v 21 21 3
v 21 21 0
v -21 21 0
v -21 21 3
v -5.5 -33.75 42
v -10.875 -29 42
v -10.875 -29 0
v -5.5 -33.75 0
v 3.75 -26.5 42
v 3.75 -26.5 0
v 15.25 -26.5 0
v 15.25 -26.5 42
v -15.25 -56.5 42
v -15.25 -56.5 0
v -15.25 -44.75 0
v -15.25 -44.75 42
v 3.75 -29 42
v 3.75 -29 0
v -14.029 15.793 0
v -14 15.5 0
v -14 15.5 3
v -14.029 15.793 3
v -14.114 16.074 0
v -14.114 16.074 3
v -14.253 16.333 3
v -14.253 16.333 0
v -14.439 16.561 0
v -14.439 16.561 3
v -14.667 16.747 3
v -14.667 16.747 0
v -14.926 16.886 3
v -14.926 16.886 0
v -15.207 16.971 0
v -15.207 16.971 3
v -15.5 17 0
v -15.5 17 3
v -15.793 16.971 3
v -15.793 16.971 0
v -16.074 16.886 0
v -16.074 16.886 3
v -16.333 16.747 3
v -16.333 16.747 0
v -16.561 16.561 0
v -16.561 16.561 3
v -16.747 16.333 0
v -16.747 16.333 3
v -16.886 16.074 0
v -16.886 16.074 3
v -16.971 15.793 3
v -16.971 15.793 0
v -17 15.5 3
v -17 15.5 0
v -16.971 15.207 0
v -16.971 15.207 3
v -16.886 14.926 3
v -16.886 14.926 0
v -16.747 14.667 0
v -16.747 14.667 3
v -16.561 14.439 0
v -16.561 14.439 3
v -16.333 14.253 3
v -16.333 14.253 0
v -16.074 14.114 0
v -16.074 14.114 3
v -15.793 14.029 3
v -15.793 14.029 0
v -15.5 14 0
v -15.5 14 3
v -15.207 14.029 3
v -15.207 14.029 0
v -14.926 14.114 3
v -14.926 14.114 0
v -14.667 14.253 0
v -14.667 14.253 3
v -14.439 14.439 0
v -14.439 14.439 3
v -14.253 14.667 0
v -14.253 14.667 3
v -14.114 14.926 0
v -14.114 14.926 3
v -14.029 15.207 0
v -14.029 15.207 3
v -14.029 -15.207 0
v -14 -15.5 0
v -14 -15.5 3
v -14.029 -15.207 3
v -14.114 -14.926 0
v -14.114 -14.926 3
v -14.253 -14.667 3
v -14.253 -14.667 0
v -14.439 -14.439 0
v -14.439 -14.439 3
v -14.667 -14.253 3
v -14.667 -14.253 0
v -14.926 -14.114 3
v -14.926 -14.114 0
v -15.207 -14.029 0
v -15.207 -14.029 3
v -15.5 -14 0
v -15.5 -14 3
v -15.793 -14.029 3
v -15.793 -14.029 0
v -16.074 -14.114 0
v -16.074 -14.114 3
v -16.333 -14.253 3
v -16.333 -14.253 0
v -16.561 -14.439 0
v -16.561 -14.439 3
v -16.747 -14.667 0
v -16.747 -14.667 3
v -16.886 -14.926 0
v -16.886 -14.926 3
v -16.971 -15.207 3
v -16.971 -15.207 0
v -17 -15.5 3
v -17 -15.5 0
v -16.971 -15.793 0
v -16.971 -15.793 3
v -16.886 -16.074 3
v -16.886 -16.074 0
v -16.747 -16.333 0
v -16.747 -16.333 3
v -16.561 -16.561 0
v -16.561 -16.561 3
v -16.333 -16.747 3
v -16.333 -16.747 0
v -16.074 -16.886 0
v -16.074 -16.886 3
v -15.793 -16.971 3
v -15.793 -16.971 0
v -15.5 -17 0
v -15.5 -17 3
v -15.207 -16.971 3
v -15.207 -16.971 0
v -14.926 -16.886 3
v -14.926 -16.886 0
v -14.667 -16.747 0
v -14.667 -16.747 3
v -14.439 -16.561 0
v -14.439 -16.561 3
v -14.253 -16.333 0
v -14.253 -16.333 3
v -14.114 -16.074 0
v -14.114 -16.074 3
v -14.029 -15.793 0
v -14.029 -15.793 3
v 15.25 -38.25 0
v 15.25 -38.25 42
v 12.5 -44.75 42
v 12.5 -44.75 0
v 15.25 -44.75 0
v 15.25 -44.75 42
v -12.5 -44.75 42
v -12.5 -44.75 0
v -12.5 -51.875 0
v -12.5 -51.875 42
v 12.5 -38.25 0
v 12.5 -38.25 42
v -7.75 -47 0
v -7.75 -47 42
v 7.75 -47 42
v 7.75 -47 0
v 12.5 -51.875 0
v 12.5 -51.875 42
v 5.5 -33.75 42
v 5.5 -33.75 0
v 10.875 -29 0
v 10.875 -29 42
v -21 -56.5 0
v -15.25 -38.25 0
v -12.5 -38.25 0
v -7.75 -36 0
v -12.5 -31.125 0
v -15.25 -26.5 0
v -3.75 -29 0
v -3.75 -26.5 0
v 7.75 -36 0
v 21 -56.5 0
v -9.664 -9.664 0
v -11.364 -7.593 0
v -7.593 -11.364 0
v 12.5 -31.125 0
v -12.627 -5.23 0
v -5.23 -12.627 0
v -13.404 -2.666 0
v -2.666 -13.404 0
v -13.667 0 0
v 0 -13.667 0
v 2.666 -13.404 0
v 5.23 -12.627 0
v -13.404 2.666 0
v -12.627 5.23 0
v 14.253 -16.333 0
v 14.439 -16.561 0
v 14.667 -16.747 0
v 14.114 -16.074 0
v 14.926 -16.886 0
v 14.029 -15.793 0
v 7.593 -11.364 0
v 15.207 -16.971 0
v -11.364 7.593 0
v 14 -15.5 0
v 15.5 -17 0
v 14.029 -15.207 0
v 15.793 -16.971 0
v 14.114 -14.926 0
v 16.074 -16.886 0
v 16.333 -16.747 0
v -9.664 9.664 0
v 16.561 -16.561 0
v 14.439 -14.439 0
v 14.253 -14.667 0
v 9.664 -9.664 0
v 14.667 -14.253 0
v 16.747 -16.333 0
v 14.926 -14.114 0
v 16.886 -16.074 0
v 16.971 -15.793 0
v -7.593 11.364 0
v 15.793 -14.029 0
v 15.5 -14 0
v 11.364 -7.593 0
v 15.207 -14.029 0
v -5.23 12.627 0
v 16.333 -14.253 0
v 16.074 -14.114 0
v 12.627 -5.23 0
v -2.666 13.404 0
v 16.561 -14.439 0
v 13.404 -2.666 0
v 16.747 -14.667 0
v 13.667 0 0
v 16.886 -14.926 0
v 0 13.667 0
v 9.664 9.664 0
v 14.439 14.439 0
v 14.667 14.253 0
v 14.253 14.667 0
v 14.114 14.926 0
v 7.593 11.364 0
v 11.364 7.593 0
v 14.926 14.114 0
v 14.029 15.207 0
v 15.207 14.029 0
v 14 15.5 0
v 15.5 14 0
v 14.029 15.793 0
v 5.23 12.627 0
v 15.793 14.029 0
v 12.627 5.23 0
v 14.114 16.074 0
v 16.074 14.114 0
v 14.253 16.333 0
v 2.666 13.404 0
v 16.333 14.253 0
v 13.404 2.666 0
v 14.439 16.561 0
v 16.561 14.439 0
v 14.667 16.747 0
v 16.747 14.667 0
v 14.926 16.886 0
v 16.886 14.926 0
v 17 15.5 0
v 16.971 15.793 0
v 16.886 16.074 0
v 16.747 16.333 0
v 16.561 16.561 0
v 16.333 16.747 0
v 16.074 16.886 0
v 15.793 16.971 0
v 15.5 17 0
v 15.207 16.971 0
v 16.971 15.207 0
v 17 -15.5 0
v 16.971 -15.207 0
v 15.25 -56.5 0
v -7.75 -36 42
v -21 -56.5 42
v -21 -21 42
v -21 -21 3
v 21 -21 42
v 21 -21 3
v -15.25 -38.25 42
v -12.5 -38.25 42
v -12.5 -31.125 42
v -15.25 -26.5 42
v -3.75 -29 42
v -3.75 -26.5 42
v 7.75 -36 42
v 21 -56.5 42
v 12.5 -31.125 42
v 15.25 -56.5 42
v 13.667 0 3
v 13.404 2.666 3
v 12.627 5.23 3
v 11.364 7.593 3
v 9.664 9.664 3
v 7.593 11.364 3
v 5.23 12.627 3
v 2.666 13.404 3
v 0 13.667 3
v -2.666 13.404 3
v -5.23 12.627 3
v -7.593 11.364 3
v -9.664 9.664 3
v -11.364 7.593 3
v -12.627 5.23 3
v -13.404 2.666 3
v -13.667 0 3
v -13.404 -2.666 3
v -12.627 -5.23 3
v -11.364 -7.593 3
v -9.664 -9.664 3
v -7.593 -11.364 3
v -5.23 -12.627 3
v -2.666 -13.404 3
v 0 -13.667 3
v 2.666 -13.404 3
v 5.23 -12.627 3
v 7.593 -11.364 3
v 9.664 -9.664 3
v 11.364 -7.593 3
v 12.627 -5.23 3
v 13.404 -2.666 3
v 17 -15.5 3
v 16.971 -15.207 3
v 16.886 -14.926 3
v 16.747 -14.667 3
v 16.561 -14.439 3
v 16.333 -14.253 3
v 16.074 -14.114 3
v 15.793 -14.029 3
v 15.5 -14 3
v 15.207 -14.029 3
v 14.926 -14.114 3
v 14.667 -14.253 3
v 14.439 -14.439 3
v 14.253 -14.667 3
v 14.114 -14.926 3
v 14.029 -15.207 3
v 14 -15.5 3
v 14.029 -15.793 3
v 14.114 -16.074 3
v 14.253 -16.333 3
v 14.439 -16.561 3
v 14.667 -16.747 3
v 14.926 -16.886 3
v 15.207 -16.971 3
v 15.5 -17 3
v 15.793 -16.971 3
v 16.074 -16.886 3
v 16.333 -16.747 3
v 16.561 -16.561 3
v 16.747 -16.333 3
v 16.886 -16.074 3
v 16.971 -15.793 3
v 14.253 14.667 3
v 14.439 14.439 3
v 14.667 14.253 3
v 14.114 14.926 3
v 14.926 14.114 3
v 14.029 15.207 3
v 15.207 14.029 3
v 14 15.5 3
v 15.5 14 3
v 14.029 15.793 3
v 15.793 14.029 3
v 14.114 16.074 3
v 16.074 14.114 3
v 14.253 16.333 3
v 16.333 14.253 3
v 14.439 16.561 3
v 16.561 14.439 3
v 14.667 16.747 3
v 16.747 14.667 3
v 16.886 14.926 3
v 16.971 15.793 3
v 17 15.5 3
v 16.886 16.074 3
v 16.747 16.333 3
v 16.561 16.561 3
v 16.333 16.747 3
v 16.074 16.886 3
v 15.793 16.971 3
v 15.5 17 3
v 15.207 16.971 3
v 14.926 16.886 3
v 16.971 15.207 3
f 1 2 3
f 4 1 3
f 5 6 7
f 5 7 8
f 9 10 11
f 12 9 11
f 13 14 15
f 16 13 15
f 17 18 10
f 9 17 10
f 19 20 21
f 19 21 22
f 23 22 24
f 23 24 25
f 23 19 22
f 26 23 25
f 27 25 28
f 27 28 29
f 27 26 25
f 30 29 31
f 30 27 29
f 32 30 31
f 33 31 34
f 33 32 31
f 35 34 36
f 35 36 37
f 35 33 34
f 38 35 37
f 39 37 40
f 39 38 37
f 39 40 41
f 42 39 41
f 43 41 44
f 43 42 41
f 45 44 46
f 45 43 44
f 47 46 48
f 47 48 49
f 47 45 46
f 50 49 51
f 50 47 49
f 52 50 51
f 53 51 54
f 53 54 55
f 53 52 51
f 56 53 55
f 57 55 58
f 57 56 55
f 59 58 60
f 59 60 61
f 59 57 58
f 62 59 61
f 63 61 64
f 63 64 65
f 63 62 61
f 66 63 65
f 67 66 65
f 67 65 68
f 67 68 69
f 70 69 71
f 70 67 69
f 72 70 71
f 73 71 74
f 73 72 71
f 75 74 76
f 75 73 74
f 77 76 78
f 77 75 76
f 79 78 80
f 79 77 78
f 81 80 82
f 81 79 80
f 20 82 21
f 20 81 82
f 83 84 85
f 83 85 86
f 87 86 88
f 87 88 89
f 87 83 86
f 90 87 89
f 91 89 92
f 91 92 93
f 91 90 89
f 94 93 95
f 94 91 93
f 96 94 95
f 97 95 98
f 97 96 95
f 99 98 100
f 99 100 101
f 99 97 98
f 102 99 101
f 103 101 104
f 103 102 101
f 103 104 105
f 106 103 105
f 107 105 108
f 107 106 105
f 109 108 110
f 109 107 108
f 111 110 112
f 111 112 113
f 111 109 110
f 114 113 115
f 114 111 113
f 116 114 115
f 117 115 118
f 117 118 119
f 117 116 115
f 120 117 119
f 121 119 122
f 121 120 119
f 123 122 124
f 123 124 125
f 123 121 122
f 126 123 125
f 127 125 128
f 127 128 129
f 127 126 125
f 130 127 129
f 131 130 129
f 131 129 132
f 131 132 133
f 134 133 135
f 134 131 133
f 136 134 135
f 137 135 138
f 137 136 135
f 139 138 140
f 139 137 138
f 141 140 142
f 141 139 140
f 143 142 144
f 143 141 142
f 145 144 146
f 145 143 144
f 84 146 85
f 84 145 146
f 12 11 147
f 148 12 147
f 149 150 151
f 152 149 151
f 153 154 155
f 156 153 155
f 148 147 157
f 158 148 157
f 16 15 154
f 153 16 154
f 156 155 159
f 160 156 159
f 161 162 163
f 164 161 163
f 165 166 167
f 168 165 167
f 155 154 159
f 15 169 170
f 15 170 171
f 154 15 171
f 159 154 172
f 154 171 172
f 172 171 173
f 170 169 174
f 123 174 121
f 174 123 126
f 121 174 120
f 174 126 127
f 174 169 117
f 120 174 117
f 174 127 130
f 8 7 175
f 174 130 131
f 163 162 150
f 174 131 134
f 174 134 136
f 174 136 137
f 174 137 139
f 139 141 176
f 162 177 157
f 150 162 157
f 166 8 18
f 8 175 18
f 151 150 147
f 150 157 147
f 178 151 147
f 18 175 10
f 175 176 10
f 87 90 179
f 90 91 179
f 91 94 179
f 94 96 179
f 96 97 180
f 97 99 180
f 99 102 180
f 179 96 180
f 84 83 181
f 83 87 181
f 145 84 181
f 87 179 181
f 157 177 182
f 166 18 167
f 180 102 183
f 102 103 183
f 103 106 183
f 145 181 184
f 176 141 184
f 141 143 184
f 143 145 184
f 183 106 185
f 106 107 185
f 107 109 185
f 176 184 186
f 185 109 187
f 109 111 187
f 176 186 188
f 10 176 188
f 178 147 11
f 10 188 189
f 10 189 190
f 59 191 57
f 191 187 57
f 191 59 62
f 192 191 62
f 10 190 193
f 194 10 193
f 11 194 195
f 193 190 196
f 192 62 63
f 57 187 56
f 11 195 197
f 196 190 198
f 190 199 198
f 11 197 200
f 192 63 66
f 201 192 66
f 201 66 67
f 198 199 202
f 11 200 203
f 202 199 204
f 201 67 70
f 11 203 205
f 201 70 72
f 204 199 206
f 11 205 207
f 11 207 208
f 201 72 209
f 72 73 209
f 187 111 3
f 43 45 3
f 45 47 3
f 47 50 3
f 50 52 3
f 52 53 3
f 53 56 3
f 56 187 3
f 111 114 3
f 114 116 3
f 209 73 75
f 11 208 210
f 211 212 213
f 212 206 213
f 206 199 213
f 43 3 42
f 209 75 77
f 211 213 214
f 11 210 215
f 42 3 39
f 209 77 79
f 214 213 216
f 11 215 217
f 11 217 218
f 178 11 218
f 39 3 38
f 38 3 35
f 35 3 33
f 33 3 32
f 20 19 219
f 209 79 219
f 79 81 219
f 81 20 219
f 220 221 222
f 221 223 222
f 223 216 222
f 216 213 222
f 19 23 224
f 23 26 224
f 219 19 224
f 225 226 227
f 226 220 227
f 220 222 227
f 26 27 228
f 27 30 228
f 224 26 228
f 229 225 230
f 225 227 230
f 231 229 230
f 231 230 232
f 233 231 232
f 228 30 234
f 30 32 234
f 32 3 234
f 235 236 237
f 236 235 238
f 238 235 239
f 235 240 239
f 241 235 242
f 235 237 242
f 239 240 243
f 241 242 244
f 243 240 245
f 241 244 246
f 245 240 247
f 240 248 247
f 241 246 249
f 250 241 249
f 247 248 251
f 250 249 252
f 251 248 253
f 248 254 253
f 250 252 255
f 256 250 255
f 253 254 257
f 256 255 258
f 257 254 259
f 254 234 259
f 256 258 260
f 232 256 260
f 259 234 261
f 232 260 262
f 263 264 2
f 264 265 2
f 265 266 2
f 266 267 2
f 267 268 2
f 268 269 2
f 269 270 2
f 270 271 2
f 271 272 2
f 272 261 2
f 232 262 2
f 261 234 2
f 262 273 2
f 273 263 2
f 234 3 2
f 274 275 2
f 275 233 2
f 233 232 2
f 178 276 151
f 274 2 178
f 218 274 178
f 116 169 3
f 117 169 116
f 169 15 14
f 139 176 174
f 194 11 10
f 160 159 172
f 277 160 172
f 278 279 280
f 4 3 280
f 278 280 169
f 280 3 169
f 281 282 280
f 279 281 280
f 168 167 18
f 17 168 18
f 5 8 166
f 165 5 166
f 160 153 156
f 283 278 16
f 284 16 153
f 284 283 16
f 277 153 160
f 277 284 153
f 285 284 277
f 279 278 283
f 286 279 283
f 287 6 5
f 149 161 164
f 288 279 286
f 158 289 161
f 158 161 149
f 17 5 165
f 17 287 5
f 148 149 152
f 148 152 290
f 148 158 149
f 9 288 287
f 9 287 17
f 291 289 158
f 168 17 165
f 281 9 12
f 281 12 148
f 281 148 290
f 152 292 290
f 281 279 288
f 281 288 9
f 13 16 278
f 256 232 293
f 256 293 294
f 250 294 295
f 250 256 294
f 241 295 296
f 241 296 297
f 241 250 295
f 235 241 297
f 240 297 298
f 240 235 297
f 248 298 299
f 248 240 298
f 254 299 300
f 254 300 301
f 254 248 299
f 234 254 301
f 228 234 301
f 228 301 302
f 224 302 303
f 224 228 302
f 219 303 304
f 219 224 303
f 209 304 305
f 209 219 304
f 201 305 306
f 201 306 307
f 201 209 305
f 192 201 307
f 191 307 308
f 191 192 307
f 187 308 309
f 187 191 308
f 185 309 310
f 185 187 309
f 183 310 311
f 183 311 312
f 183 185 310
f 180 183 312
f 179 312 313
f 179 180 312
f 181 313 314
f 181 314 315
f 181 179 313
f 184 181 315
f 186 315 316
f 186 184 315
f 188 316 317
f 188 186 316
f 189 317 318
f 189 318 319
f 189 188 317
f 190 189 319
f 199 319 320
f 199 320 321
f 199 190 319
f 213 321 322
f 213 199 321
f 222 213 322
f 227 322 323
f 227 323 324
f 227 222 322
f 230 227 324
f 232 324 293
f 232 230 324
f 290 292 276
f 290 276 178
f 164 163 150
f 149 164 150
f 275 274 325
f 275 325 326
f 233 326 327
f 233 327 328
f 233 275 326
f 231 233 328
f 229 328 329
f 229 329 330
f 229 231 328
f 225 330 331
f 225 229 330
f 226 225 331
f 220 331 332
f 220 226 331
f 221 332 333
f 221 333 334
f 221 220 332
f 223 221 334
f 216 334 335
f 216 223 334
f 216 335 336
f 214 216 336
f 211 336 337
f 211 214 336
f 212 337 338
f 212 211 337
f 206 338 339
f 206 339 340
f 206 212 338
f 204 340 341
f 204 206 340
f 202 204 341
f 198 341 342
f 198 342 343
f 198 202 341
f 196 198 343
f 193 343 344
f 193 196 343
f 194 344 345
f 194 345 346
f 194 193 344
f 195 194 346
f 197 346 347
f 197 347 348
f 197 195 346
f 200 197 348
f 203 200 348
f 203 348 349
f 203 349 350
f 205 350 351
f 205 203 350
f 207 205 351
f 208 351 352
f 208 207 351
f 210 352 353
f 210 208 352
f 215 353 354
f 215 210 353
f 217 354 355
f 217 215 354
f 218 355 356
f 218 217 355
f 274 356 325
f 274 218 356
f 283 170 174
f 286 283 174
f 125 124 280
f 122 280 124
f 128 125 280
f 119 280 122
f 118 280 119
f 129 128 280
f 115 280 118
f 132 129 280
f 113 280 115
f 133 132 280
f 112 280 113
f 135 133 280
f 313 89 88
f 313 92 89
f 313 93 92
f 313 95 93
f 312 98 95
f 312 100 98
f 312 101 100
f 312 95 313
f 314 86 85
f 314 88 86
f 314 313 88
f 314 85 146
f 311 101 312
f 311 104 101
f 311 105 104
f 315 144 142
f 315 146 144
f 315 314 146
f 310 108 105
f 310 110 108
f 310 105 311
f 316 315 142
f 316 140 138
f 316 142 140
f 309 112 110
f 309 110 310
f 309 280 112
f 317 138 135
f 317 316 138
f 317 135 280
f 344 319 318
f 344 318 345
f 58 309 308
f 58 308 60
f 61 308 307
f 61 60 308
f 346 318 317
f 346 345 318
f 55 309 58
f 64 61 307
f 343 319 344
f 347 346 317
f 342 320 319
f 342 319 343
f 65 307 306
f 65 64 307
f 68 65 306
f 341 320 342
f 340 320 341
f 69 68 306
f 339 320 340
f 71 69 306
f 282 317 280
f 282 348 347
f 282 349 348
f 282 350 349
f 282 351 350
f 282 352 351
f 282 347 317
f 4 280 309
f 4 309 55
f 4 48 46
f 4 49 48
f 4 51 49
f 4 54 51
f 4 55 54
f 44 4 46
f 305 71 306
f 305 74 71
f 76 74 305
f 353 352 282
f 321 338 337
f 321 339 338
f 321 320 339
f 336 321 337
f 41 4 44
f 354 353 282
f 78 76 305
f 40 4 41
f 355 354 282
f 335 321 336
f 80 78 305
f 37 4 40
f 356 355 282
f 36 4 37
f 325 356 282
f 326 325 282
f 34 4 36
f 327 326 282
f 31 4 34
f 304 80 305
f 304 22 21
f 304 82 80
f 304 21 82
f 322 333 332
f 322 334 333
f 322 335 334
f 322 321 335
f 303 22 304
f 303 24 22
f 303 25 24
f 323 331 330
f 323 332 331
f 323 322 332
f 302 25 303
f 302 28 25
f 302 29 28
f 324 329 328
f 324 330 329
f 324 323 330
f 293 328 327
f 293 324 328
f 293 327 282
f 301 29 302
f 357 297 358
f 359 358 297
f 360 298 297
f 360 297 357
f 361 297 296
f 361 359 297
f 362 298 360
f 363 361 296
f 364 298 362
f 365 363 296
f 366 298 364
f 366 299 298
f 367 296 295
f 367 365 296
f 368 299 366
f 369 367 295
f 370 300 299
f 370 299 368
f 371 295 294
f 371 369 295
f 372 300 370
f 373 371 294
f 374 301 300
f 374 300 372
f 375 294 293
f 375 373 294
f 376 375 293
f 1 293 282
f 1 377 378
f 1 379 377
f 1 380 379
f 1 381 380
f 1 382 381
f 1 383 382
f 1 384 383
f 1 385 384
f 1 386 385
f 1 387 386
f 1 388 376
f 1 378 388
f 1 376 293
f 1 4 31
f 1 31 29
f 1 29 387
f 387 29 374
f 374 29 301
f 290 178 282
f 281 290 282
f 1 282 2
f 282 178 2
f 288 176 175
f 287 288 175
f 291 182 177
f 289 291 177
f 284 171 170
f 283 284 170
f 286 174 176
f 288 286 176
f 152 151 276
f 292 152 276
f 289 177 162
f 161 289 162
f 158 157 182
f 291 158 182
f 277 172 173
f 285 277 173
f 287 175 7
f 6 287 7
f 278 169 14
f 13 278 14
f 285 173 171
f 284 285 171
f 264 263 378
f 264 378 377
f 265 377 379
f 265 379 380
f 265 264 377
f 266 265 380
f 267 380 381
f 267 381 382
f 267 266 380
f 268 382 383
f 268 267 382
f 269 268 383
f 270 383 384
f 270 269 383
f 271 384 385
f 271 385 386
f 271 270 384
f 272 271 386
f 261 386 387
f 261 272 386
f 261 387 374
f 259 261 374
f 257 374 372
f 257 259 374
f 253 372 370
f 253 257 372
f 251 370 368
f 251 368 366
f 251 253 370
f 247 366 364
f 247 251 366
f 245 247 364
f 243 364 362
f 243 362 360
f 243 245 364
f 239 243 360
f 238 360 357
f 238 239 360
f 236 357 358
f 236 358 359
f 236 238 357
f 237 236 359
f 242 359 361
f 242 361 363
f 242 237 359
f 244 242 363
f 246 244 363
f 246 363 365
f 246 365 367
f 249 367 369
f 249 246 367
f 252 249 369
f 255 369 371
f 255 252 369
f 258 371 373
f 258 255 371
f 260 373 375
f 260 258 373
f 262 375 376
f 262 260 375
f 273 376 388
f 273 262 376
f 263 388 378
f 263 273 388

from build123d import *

# Parameters (mm, degrees)
F0_R     = 1.5
F0_R_2   = 13.6669430684
F1_DEPTH = 3
F2_DEPTH = 42


# Not quite as in the source:
# - a feature names something its author has since deleted; it is built from what else it names


with BuildPart() as f1:
    # F0 (on Top) → F1 (new body)
    with BuildSketch(Plane.XY):
        Polygon((21, 21), (-21, 21), (-21, -21), (-3.25, -21), (0, -21), (3.25, -21), (21, -21), align=None)
        with Locations((-15.5, -15.5)):
            Circle(F0_R, mode=Mode.SUBTRACT)
        with Locations((-15.5, 15.5)):
            Circle(F0_R, mode=Mode.SUBTRACT)
        Circle(F0_R_2, mode=Mode.SUBTRACT)
        with Locations((15.5, -15.5)):
            Circle(F0_R, mode=Mode.SUBTRACT)
        with Locations((15.5, 15.5)):
            Circle(F0_R, mode=Mode.SUBTRACT)
    extrude(amount=F1_DEPTH)

    # F0 (on Top) → F2 (join)
    with BuildSketch(Plane.XY):
        Polygon((12.5, -44.75), (15.25, -44.75), (15.25, -38.25), (12.5, -38.25), (12.5, -31.125), (7.75, -36), (7.75, -41.5), (7.75, -47), (12.5, -51.875), align=None)
        Polygon((-3.25, -21), (-21, -21), (-21, -26.5), (-21, -56.5), (-15.25, -56.5), (-15.25, -44.75), (-15.25, -38.25), (-15.25, -26.5), (-3.75, -26.5), (0, -26.5), (3.75, -26.5), (15.25, -26.5), (15.25, -38.25), (15.25, -44.75), (15.25, -56.5), (21, -56.5), (21, -26.5), (21, -21), (3.25, -21), (0, -21), align=None)
        Polygon((0, -26.5), (-3.75, -26.5), (-3.75, -29), (-10.875, -29), (-5.5, -33.75), (0, -33.75), (5.5, -33.75), (10.875, -29), (3.75, -29), (3.75, -26.5), align=None)
        Polygon((-15.25, -38.25), (-15.25, -44.75), (-12.5, -44.75), (-12.5, -51.875), (-7.75, -47), (-7.75, -41.5), (-7.75, -36), (-12.5, -31.125), (-12.5, -38.25), align=None)
    extrude(amount=F2_DEPTH)


solid = f1.part
